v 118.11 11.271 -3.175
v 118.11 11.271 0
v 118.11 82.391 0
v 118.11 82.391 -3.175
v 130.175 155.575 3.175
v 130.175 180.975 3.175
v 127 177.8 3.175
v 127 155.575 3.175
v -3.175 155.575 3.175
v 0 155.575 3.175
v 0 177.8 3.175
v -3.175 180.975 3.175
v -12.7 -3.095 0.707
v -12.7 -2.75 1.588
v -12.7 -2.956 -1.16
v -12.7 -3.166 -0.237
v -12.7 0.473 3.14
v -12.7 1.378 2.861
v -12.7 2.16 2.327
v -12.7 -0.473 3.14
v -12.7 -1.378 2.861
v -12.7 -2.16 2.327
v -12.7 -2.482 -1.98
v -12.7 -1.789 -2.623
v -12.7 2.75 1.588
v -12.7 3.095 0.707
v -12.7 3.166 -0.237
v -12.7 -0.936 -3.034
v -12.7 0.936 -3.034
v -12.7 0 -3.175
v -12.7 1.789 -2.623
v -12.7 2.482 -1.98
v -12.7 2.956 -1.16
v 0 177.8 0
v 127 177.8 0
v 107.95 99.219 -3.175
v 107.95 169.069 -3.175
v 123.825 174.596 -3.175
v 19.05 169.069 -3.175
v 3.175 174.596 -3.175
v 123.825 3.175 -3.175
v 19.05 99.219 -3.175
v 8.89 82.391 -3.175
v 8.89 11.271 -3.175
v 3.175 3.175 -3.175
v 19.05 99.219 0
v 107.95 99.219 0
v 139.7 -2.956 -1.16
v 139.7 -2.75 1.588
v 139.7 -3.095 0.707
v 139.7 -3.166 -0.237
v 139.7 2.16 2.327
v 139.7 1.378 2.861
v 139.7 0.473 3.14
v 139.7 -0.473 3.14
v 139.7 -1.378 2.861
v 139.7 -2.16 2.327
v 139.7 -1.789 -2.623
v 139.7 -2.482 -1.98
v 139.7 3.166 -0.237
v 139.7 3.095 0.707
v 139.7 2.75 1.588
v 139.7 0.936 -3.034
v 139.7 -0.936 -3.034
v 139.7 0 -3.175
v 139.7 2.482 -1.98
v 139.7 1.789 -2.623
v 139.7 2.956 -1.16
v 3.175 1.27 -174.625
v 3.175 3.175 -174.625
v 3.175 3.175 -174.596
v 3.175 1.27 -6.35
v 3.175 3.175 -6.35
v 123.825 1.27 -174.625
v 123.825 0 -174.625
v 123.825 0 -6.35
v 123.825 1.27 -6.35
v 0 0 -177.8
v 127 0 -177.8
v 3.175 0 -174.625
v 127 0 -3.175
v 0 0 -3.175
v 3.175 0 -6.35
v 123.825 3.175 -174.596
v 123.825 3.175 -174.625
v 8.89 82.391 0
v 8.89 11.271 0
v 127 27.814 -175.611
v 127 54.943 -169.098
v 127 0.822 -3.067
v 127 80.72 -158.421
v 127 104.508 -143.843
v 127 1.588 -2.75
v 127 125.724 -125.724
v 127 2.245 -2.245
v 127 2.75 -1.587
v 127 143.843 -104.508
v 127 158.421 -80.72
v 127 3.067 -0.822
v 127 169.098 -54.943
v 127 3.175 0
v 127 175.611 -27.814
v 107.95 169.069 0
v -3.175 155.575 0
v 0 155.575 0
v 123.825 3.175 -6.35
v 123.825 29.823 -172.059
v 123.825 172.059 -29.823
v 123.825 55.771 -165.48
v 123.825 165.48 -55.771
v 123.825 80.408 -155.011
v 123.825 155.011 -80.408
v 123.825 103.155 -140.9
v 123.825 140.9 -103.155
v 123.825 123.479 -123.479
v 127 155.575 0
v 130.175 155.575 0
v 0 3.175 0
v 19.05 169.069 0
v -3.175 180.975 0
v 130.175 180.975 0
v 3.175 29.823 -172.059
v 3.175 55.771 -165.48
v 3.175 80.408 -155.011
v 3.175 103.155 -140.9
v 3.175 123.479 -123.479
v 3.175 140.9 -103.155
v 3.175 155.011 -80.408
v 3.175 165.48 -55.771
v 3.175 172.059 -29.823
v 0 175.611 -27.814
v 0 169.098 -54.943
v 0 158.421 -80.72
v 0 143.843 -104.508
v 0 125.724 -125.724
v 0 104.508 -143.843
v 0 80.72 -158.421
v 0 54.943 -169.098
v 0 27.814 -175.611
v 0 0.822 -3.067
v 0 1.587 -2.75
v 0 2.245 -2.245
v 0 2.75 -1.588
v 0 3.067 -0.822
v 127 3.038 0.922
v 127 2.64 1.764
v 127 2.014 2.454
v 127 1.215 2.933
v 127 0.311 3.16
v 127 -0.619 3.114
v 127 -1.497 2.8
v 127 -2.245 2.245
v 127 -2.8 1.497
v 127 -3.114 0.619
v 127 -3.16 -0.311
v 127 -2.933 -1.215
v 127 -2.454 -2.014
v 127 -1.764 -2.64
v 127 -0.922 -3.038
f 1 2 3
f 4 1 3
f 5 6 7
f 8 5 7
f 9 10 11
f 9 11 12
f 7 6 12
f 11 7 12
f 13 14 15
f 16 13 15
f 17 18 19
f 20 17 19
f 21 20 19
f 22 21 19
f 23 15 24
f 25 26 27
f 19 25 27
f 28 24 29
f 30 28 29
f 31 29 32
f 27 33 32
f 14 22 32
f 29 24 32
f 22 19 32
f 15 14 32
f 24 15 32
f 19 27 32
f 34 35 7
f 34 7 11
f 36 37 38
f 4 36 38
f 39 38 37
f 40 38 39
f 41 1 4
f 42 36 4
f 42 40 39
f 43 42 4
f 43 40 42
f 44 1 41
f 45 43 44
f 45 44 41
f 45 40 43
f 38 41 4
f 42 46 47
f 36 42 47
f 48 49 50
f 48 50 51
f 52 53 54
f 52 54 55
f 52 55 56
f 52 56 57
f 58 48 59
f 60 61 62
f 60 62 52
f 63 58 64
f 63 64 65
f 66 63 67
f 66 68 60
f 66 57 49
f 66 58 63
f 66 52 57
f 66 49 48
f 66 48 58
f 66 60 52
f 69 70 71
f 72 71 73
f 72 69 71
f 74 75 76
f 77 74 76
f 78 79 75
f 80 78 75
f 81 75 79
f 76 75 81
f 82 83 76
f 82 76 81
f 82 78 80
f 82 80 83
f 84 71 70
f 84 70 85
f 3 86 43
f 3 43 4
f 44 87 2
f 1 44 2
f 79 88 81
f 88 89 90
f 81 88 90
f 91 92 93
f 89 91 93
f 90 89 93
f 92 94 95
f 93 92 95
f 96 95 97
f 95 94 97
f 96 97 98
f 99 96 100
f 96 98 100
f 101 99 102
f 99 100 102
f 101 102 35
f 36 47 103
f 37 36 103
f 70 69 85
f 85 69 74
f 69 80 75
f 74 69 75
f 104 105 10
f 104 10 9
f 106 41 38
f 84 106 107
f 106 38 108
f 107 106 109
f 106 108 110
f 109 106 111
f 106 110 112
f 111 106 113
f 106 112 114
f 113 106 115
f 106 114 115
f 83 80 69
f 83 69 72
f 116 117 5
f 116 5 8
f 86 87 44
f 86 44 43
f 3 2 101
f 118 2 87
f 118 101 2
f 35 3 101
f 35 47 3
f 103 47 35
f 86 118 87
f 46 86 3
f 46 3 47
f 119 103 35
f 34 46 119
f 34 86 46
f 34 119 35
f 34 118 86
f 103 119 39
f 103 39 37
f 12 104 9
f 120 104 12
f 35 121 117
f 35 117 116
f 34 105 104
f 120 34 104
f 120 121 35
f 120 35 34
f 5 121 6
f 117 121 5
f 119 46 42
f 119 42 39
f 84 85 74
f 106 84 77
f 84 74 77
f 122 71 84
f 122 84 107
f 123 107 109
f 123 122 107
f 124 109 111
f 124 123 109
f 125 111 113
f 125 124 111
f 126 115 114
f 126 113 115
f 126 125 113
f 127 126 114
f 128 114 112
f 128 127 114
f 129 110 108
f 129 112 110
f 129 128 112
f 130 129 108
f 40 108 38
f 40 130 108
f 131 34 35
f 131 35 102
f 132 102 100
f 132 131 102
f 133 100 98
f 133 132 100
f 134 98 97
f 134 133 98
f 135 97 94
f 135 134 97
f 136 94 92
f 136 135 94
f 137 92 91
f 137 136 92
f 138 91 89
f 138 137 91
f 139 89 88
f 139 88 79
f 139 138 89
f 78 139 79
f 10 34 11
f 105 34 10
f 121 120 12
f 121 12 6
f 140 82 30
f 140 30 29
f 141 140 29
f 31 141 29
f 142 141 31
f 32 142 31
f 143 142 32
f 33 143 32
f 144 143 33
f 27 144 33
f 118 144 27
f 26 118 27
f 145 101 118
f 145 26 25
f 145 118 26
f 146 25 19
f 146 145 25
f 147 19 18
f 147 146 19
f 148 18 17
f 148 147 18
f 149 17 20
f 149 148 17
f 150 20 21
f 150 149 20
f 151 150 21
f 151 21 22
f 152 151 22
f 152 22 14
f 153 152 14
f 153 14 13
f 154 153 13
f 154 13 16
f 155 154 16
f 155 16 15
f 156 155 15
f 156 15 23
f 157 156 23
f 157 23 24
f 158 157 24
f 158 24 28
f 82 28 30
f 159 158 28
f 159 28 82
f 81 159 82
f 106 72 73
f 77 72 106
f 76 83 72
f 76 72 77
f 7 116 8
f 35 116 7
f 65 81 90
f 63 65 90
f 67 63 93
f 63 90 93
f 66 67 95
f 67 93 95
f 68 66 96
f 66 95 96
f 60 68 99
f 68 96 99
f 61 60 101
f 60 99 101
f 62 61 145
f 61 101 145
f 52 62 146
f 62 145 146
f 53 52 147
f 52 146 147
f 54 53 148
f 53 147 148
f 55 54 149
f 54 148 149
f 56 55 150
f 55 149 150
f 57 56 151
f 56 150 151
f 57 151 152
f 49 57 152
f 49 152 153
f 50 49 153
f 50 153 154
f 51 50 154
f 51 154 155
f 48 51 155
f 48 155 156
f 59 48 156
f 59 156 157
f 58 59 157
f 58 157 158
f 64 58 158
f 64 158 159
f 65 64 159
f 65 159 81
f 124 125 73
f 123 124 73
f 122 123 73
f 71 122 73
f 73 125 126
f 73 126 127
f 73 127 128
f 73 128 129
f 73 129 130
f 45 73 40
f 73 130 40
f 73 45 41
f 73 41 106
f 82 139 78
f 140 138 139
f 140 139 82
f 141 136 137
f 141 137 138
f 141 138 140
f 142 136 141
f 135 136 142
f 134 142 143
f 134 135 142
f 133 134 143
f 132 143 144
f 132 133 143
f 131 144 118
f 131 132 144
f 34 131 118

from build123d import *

# Parameters (mm, degrees)
BOSS_EXTRUDE1_DEPTH      = 127
BOSS_EXTRUDE2_DEPTH      = 3.175
SKETCH4_R                = 3.175
BOSS_EXTRUDE7_DEPTH      = 12.7
BOSS_EXTRUDE7_DEPTH_BACK = 139.7
SKETCH5_W                = 88.9
SKETCH5_H                = 69.85
SKETCH5_W_2              = 109.22
SKETCH5_H_2              = 71.12
CUT_EXTRUDE2_DEPTH       = 5.08
CUT_EXTRUDE3_DEPTH       = 127
SKETCH7_W                = 120.65
SKETCH7_H                = 168.275
CUT_EXTRUDE4_DEPTH       = 3.175
BOSS_EXTRUDE9_DEPTH      = 3.175
BOSS_EXTRUDE10_DEPTH     = 3.175


with BuildPart() as part:
    # Sketch1 → Boss-Extrude1 (new body)
    with BuildSketch(Plane(origin=(0, 0, 0), x_dir=(0, 0, -1), z_dir=(1, 0, 0))):
        with BuildLine():
            Line((0, 0), (0, 177.8))
            ThreePointArc((0, 177.8), (125.723585695, 125.723585695), (177.8, 0))
            Line((177.8, 0), (0, 0))
        make_face()
    extrude(amount=BOSS_EXTRUDE1_DEPTH)

    # Sketch4 → Boss-Extrude7 (add, two sides)
    with BuildSketch(Plane(origin=(127, 0, 0), x_dir=(0, 0, -1), z_dir=(1, 0, 0))) as boss_extrude7_sk:
        Circle(SKETCH4_R)
    extrude(amount=BOSS_EXTRUDE7_DEPTH)
    extrude(boss_extrude7_sk.sketch, amount=-BOSS_EXTRUDE7_DEPTH_BACK)

    # Sketch5 → Cut-Extrude2 (cut)
    with BuildSketch(Plane.XY):
        with Locations((63.5, 134.14375)):
            Rectangle(SKETCH5_W, SKETCH5_H)
        with Locations((63.5, 46.83125)):
            Rectangle(SKETCH5_W_2, SKETCH5_H_2)
    extrude(amount=-CUT_EXTRUDE2_DEPTH, mode=Mode.SUBTRACT)

    # Sketch6 → Cut-Extrude3 (cut)
    with BuildSketch(Plane.ZY):
        with BuildLine():
            Line((-3.175, 3.175), (-174.596133978, 3.175))
            ThreePointArc((-174.596133978, 3.175), (-123.478521665, 123.478521665), (-3.175, 174.596133978))
            Line((-3.175, 174.596133978), (-3.175, 3.175))
        make_face()
    extrude(amount=-CUT_EXTRUDE3_DEPTH, mode=Mode.SUBTRACT)

    # Sketch7 → Cut-Extrude4 (cut)
    with BuildSketch(Plane.XZ):
        with Locations((63.5, -90.4875)):
            Rectangle(SKETCH7_W, SKETCH7_H)
    extrude(amount=-CUT_EXTRUDE4_DEPTH, mode=Mode.SUBTRACT)

    # Sketch8 → Boss-Extrude9 (add)
    with BuildSketch(Plane.ZY):
        with BuildLine():
            Line((-176.525431596, 1.27), (-4.259709497, 1.27))
            ThreePointArc((-4.259709497, 1.27), (-3.143089642, 3.143089642), (-1.27, 4.259709497))
            Line((-1.27, 4.259709497), (-1.27, 176.525431596))
            ThreePointArc((-1.27, 176.525431596), (-124.825560083, 124.825560083), (-176.525431596, 1.27))
        make_face()
    extrude(amount=-BOSS_EXTRUDE9_DEPTH)

    # Sketch9 → Boss-Extrude10 (add)
    with BuildSketch(Plane(origin=(127, 0, 0), x_dir=(0, 0, -1), z_dir=(1, 0, 0))):
        with BuildLine():
            Line((4.259709497, 1.27), (176.525431596, 1.27))
            ThreePointArc((176.525431596, 1.27), (124.825560083, 124.825560083), (1.27, 176.525431596))
            Line((1.27, 176.525431596), (1.27, 4.259709497))
            ThreePointArc((1.27, 4.259709497), (3.143089642, 3.143089642), (4.259709497, 1.27))
        make_face()
    extrude(amount=-BOSS_EXTRUDE10_DEPTH)


with BuildPart() as body_2:
    # Sketch2 → Boss-Extrude2 (new body)
    with BuildSketch(Plane.XY):
        Polygon((0, 155.575), (-3.175, 155.575), (-3.175, 180.975), (130.175, 180.975), (130.175, 155.575), (127, 155.575), (127, 177.8), (0, 177.8), align=None)
    extrude(amount=BOSS_EXTRUDE2_DEPTH)


solid = Compound([part.part, body_2.part])
